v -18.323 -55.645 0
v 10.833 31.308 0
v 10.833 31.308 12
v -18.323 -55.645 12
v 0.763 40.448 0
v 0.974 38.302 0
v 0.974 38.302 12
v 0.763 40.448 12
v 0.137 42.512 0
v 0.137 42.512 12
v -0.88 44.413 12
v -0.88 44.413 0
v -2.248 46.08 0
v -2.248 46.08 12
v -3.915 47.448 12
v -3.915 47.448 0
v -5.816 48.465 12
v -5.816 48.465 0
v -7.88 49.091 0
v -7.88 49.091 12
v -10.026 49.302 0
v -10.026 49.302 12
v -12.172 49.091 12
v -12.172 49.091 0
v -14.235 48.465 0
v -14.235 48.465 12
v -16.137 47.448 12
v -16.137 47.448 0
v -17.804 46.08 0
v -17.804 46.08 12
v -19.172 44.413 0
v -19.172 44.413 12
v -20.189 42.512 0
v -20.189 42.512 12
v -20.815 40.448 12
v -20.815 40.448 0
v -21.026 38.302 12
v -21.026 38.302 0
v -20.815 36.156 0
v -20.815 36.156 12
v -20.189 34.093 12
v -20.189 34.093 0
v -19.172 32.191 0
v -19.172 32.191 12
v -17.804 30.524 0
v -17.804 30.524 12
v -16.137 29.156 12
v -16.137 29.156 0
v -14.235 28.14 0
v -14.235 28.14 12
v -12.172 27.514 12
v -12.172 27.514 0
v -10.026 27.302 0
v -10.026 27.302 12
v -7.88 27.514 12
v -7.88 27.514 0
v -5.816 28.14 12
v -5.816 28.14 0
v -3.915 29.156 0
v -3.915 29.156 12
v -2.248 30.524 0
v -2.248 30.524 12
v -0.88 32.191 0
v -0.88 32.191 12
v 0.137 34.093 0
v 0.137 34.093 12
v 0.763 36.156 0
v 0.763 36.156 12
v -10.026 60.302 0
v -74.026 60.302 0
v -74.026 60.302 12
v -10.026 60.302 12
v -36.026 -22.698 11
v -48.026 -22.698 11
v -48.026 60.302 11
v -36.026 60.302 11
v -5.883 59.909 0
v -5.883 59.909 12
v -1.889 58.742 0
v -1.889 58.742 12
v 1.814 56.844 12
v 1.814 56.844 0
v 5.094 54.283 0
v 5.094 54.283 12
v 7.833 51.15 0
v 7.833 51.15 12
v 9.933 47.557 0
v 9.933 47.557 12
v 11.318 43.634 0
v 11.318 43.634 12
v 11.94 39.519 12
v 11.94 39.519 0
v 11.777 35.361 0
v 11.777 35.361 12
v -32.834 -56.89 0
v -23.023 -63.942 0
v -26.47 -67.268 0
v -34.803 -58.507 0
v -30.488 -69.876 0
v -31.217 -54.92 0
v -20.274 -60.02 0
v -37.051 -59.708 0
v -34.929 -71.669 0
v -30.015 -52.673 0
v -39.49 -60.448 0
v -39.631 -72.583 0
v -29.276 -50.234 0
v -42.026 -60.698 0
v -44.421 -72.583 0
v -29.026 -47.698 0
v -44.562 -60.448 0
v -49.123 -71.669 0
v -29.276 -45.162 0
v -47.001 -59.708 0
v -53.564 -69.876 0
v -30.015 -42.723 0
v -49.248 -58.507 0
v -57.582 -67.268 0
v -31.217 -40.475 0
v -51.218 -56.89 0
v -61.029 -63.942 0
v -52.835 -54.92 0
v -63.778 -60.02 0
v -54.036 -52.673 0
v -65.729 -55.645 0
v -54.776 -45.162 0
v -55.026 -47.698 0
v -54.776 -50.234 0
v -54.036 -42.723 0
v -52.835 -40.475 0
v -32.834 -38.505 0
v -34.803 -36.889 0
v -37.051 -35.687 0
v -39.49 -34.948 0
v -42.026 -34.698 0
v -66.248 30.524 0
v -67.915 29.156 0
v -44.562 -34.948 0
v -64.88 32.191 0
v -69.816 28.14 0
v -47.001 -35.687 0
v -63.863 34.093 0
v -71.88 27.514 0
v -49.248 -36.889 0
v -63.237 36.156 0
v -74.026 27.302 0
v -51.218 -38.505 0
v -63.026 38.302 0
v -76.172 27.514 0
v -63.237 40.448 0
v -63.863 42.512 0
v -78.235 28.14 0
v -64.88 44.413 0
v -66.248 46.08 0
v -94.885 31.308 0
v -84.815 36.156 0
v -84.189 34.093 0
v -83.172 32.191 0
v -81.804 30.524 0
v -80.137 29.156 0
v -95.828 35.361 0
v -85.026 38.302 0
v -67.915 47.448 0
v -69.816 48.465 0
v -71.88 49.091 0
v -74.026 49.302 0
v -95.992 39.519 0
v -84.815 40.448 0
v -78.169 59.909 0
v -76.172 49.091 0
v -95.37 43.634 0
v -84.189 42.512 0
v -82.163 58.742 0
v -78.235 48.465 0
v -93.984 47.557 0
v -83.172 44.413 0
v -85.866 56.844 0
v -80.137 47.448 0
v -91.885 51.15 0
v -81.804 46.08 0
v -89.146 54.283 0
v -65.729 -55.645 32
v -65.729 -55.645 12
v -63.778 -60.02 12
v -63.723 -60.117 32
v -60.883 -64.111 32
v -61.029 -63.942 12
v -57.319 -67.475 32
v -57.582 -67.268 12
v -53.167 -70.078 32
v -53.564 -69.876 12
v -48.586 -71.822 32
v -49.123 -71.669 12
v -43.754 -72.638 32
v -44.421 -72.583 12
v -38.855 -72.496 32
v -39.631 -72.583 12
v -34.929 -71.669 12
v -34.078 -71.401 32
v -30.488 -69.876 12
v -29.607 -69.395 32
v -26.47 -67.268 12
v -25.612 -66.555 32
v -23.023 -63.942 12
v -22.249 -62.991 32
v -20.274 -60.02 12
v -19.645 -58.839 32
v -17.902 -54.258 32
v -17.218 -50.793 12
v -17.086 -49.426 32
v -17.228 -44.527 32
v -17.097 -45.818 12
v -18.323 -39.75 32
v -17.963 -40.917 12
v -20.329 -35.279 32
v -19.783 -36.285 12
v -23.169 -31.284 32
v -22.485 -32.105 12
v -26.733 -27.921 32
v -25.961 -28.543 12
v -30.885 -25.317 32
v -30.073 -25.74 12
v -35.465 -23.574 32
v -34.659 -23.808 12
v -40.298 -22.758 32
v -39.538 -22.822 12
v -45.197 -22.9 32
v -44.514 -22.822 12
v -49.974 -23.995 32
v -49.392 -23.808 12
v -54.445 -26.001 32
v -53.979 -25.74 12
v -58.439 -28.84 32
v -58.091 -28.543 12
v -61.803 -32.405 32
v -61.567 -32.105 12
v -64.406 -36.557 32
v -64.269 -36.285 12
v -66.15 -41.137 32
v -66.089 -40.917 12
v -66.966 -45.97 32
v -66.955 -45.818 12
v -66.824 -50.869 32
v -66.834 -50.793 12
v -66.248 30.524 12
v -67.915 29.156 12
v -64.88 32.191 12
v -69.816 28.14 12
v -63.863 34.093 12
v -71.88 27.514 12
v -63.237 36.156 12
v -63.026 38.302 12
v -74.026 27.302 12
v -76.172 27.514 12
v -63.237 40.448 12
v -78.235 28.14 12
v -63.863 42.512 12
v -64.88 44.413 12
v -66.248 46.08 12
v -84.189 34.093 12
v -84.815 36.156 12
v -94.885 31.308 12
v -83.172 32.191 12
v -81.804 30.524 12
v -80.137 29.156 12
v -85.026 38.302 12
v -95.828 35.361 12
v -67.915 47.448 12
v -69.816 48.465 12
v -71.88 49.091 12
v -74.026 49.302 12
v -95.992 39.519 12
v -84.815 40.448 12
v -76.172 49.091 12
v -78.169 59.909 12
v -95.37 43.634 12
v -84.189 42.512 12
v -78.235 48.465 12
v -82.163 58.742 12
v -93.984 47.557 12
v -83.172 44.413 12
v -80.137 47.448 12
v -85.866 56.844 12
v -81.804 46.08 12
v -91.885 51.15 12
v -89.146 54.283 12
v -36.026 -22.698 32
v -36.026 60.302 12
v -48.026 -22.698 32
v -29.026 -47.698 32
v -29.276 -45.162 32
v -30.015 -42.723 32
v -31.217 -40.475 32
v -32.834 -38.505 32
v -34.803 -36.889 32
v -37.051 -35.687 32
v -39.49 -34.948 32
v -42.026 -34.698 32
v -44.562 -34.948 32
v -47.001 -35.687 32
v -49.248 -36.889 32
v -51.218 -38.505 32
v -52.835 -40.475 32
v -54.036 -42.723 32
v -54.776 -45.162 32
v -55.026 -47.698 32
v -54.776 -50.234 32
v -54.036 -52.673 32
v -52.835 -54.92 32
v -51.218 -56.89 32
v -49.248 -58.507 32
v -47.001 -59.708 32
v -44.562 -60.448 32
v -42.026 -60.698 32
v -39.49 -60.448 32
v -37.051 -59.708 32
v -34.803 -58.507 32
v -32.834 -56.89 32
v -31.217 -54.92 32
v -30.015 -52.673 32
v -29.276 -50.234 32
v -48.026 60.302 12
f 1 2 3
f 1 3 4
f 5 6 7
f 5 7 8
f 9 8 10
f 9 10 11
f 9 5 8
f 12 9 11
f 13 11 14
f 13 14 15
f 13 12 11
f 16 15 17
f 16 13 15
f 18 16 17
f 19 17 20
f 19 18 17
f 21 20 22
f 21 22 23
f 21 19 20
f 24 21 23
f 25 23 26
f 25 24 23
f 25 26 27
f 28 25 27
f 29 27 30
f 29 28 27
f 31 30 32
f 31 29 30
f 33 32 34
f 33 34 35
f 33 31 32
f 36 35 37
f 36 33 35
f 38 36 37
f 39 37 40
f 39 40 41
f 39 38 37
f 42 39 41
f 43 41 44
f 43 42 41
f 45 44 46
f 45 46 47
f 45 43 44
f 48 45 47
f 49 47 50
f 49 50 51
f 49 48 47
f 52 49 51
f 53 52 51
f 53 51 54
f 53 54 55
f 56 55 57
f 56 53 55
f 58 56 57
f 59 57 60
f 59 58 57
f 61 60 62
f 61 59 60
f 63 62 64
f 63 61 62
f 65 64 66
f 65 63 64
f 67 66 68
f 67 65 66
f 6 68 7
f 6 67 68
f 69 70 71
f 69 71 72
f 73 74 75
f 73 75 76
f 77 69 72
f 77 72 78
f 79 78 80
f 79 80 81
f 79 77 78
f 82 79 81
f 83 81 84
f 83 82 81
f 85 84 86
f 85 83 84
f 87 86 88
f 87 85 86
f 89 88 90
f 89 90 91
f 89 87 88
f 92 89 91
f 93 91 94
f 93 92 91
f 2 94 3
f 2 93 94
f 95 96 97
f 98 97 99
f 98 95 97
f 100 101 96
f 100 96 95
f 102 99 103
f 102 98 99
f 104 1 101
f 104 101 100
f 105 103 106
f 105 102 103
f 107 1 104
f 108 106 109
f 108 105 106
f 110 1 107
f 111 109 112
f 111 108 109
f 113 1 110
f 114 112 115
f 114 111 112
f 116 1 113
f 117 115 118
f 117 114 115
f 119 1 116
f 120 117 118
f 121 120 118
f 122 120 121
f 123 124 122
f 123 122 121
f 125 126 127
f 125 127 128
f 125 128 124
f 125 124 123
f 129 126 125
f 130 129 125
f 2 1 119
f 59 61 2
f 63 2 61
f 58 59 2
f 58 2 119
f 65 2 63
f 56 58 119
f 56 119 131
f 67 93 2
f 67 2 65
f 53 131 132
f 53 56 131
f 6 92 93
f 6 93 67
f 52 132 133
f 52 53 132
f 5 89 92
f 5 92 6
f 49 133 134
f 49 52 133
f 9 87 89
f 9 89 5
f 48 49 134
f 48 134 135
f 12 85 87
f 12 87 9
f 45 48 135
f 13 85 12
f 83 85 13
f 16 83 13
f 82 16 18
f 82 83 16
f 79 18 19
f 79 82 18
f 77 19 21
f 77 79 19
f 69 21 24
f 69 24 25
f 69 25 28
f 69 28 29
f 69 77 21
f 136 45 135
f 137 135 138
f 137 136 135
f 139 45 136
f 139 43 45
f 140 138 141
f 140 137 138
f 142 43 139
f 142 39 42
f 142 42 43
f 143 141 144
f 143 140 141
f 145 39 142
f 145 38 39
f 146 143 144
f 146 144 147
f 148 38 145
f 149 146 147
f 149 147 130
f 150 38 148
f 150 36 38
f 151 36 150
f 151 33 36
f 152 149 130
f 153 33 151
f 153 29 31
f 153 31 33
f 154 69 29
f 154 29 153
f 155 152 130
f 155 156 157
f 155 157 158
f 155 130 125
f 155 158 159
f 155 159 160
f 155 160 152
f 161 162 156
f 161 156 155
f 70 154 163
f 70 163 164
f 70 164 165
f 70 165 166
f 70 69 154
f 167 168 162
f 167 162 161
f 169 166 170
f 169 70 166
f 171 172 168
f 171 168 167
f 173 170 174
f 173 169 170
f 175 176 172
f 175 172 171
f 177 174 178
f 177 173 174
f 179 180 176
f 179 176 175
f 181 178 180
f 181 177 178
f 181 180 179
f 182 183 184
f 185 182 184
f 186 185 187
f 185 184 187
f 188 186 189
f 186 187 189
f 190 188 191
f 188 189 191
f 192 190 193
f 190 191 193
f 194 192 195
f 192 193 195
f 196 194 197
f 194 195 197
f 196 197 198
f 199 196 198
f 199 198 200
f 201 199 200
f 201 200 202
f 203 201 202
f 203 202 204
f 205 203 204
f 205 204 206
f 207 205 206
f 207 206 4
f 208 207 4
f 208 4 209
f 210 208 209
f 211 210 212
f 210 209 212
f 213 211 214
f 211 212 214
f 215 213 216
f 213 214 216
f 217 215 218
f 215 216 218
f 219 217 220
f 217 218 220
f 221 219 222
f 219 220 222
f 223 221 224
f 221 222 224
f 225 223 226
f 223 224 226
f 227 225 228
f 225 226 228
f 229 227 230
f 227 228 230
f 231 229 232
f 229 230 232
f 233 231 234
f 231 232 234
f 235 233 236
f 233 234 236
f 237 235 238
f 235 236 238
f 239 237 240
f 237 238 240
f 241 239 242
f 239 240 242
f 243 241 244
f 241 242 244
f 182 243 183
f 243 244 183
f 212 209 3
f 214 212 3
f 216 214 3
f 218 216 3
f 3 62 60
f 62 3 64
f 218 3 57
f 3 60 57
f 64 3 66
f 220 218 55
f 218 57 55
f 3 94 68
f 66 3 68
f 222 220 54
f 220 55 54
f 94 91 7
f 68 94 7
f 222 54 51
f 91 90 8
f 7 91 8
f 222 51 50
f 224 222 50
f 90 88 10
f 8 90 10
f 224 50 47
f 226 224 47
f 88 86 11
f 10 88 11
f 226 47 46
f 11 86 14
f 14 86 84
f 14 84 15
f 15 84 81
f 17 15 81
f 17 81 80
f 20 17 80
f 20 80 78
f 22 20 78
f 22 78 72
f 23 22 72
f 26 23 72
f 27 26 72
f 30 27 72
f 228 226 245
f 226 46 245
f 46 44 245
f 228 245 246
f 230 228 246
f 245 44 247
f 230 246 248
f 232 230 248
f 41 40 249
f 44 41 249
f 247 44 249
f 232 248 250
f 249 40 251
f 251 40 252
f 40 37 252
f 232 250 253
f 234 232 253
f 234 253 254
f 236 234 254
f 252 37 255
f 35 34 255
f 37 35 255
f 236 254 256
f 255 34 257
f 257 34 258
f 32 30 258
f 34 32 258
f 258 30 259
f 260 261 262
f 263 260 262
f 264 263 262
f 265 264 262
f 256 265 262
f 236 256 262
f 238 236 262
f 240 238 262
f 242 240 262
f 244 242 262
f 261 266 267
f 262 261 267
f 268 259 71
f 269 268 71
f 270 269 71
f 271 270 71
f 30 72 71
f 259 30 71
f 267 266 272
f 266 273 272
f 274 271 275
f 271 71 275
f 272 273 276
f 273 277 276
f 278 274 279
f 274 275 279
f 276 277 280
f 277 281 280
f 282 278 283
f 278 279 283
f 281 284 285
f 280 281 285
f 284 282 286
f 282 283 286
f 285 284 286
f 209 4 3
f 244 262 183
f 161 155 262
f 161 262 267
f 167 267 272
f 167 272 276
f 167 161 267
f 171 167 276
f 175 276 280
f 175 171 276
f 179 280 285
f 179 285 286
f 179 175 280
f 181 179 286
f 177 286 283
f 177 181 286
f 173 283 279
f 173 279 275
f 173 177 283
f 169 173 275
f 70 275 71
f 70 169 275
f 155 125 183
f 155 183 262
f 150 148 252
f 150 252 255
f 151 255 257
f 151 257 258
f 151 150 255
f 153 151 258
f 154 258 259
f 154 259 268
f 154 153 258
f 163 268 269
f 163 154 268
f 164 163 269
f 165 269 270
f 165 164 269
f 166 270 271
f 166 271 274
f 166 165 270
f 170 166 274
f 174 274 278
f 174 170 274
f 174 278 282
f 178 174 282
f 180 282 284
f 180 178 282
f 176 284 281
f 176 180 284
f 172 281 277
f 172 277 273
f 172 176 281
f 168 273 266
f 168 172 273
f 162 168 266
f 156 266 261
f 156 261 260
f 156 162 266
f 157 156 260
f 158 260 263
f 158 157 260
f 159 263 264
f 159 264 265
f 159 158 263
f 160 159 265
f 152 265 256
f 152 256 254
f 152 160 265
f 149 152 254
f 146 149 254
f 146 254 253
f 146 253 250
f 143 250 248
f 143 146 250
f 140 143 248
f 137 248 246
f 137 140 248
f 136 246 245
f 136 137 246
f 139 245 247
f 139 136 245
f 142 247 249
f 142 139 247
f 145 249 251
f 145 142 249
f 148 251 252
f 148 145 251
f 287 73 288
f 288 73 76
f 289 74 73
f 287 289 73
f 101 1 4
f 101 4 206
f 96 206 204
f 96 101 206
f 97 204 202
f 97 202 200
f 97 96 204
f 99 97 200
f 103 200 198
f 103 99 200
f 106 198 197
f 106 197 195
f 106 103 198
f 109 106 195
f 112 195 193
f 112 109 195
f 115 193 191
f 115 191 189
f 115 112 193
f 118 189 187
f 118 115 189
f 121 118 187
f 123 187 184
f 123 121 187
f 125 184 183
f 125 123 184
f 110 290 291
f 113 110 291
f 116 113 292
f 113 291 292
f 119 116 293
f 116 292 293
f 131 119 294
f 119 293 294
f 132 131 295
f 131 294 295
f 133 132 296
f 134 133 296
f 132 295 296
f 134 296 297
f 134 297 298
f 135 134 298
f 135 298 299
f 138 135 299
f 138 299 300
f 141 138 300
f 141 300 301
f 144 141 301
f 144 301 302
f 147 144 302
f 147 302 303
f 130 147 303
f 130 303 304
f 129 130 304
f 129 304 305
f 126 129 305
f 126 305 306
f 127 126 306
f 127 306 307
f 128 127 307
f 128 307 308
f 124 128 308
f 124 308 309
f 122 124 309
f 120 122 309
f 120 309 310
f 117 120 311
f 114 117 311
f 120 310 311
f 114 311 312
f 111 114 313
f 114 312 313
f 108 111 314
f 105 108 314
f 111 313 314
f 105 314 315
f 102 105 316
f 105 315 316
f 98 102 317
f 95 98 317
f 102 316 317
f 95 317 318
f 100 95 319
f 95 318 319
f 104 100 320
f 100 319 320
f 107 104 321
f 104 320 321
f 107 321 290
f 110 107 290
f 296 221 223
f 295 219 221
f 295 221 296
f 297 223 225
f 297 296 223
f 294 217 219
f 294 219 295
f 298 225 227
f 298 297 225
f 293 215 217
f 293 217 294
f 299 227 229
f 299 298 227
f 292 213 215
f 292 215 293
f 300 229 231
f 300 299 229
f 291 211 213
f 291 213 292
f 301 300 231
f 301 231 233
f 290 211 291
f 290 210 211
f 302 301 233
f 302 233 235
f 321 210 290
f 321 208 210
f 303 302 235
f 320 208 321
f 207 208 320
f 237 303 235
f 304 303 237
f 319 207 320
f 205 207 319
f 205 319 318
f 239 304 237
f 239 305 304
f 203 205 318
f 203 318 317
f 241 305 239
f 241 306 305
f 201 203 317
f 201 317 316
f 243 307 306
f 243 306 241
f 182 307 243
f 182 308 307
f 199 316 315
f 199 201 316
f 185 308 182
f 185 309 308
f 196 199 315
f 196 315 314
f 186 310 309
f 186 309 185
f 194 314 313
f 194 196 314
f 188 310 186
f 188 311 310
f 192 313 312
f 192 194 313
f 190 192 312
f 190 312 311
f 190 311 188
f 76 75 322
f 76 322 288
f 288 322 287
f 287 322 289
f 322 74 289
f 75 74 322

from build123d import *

# Parameters (mm, degrees)
IZIM1_R                           = 11
IZIM1_R_2                         = 13
Y_KSEKLIK_EKSTR_ZYON9_DEPTH       = 12
IZIM11_R                          = 25
Y_KSEKLIK_EKSTR_ZYON10_DEPTH      = 20
KES_EKSTR_ZYON4_REACH             = 126.619
IZIM12_R                          = 13
Y_KSEKLIK_EKSTR_ZYON32_DEPTH      = 20
Y_KSEKLIK_EKSTR_ZYON32_DEPTH_BACK = 1
IZIM13_W                          = 12
IZIM13_H                          = 83
KES_EKSTR_ZYON5_DEPTH             = 12


with BuildPart() as part:
    # Çizim1 → Yükseklik-Ekstrüzyon9 (new body)
    with BuildSketch(Plane.XY):
        with BuildLine():
            Line((-74.025903813, 60.302190491), (-10.025903813, 60.302190491))
            ThreePointArc((-10.025903813, 60.302190491), (7.832798293, 51.150021402), (10.832785726, 31.3082595))
            Line((10.832785726, 31.3082595), (-18.322847519, -55.645458362))
            ThreePointArc((-18.322847519, -55.645458362), (-42.025903813, -72.697809509), (-65.728960107, -55.645458362))
            Line((-65.728960107, -55.645458362), (-94.884593352, 31.3082595))
            ThreePointArc((-94.884593352, 31.3082595), (-91.884605919, 51.150021402), (-74.025903813, 60.302190491))
        make_face()
        with Locations((-74.025903813, 38.302190491)):
            Circle(IZIM1_R, mode=Mode.SUBTRACT)
        with Locations((-10.025903813, 38.302190491)):
            Circle(IZIM1_R, mode=Mode.SUBTRACT)
        with Locations((-42.025903813, -47.697809509)):
            Circle(IZIM1_R_2, mode=Mode.SUBTRACT)
    extrude(amount=Y_KSEKLIK_EKSTR_ZYON9_DEPTH)

    # Çizim11 → Yükseklik-Ekstrüzyon10 (add)
    with BuildSketch(Plane.XY.offset(12)):
        with Locations(Location((-42.025903813, -47.697809509, 0), (0, 0, 198.536333039))):
            Circle(IZIM11_R)
    extrude(amount=Y_KSEKLIK_EKSTR_ZYON10_DEPTH)

    # Çizim12 → Kes-Ekstrüzyon4 (cut, up to next)
    with BuildSketch(Plane.XY.offset(32), mode=Mode.PRIVATE) as kes_ekstr_zyon4_sk1:
        with Locations((-42.025903813, -47.697809509)):
            Circle(IZIM12_R)
    kes_ekstr_zyon4_tool1 = extrude(kes_ekstr_zyon4_sk1.sketch, amount=-KES_EKSTR_ZYON4_REACH, mode=Mode.PRIVATE) & part.part
    add(kes_ekstr_zyon4_tool1.solids().sort_by_distance((-42.025904, -47.69781, 32))[0], mode=Mode.SUBTRACT)


with BuildPart() as body_2:
    # Çizim13 → Yükseklik-Ekstrüzyon32 (new, two sides: drawn at the far end of the back side and taken through both)
    with BuildSketch(Plane.XY.offset(12).offset(-Y_KSEKLIK_EKSTR_ZYON32_DEPTH_BACK)):
        with Locations((-42.025903813, 18.802190491)):
            Rectangle(IZIM13_W, IZIM13_H)
    extrude(amount=Y_KSEKLIK_EKSTR_ZYON32_DEPTH + Y_KSEKLIK_EKSTR_ZYON32_DEPTH_BACK)

    # Çizim14 → Kes-Ekstrüzyon5 (cut)
    with BuildSketch(Plane.ZY.offset(48.025903813)):
        Polygon((12, 60.302190491), (32, -22.697809509), (32, 60.302190491), align=None)
    extrude(amount=-KES_EKSTR_ZYON5_DEPTH, mode=Mode.SUBTRACT)


solid = Compound([part.part, body_2.part])
